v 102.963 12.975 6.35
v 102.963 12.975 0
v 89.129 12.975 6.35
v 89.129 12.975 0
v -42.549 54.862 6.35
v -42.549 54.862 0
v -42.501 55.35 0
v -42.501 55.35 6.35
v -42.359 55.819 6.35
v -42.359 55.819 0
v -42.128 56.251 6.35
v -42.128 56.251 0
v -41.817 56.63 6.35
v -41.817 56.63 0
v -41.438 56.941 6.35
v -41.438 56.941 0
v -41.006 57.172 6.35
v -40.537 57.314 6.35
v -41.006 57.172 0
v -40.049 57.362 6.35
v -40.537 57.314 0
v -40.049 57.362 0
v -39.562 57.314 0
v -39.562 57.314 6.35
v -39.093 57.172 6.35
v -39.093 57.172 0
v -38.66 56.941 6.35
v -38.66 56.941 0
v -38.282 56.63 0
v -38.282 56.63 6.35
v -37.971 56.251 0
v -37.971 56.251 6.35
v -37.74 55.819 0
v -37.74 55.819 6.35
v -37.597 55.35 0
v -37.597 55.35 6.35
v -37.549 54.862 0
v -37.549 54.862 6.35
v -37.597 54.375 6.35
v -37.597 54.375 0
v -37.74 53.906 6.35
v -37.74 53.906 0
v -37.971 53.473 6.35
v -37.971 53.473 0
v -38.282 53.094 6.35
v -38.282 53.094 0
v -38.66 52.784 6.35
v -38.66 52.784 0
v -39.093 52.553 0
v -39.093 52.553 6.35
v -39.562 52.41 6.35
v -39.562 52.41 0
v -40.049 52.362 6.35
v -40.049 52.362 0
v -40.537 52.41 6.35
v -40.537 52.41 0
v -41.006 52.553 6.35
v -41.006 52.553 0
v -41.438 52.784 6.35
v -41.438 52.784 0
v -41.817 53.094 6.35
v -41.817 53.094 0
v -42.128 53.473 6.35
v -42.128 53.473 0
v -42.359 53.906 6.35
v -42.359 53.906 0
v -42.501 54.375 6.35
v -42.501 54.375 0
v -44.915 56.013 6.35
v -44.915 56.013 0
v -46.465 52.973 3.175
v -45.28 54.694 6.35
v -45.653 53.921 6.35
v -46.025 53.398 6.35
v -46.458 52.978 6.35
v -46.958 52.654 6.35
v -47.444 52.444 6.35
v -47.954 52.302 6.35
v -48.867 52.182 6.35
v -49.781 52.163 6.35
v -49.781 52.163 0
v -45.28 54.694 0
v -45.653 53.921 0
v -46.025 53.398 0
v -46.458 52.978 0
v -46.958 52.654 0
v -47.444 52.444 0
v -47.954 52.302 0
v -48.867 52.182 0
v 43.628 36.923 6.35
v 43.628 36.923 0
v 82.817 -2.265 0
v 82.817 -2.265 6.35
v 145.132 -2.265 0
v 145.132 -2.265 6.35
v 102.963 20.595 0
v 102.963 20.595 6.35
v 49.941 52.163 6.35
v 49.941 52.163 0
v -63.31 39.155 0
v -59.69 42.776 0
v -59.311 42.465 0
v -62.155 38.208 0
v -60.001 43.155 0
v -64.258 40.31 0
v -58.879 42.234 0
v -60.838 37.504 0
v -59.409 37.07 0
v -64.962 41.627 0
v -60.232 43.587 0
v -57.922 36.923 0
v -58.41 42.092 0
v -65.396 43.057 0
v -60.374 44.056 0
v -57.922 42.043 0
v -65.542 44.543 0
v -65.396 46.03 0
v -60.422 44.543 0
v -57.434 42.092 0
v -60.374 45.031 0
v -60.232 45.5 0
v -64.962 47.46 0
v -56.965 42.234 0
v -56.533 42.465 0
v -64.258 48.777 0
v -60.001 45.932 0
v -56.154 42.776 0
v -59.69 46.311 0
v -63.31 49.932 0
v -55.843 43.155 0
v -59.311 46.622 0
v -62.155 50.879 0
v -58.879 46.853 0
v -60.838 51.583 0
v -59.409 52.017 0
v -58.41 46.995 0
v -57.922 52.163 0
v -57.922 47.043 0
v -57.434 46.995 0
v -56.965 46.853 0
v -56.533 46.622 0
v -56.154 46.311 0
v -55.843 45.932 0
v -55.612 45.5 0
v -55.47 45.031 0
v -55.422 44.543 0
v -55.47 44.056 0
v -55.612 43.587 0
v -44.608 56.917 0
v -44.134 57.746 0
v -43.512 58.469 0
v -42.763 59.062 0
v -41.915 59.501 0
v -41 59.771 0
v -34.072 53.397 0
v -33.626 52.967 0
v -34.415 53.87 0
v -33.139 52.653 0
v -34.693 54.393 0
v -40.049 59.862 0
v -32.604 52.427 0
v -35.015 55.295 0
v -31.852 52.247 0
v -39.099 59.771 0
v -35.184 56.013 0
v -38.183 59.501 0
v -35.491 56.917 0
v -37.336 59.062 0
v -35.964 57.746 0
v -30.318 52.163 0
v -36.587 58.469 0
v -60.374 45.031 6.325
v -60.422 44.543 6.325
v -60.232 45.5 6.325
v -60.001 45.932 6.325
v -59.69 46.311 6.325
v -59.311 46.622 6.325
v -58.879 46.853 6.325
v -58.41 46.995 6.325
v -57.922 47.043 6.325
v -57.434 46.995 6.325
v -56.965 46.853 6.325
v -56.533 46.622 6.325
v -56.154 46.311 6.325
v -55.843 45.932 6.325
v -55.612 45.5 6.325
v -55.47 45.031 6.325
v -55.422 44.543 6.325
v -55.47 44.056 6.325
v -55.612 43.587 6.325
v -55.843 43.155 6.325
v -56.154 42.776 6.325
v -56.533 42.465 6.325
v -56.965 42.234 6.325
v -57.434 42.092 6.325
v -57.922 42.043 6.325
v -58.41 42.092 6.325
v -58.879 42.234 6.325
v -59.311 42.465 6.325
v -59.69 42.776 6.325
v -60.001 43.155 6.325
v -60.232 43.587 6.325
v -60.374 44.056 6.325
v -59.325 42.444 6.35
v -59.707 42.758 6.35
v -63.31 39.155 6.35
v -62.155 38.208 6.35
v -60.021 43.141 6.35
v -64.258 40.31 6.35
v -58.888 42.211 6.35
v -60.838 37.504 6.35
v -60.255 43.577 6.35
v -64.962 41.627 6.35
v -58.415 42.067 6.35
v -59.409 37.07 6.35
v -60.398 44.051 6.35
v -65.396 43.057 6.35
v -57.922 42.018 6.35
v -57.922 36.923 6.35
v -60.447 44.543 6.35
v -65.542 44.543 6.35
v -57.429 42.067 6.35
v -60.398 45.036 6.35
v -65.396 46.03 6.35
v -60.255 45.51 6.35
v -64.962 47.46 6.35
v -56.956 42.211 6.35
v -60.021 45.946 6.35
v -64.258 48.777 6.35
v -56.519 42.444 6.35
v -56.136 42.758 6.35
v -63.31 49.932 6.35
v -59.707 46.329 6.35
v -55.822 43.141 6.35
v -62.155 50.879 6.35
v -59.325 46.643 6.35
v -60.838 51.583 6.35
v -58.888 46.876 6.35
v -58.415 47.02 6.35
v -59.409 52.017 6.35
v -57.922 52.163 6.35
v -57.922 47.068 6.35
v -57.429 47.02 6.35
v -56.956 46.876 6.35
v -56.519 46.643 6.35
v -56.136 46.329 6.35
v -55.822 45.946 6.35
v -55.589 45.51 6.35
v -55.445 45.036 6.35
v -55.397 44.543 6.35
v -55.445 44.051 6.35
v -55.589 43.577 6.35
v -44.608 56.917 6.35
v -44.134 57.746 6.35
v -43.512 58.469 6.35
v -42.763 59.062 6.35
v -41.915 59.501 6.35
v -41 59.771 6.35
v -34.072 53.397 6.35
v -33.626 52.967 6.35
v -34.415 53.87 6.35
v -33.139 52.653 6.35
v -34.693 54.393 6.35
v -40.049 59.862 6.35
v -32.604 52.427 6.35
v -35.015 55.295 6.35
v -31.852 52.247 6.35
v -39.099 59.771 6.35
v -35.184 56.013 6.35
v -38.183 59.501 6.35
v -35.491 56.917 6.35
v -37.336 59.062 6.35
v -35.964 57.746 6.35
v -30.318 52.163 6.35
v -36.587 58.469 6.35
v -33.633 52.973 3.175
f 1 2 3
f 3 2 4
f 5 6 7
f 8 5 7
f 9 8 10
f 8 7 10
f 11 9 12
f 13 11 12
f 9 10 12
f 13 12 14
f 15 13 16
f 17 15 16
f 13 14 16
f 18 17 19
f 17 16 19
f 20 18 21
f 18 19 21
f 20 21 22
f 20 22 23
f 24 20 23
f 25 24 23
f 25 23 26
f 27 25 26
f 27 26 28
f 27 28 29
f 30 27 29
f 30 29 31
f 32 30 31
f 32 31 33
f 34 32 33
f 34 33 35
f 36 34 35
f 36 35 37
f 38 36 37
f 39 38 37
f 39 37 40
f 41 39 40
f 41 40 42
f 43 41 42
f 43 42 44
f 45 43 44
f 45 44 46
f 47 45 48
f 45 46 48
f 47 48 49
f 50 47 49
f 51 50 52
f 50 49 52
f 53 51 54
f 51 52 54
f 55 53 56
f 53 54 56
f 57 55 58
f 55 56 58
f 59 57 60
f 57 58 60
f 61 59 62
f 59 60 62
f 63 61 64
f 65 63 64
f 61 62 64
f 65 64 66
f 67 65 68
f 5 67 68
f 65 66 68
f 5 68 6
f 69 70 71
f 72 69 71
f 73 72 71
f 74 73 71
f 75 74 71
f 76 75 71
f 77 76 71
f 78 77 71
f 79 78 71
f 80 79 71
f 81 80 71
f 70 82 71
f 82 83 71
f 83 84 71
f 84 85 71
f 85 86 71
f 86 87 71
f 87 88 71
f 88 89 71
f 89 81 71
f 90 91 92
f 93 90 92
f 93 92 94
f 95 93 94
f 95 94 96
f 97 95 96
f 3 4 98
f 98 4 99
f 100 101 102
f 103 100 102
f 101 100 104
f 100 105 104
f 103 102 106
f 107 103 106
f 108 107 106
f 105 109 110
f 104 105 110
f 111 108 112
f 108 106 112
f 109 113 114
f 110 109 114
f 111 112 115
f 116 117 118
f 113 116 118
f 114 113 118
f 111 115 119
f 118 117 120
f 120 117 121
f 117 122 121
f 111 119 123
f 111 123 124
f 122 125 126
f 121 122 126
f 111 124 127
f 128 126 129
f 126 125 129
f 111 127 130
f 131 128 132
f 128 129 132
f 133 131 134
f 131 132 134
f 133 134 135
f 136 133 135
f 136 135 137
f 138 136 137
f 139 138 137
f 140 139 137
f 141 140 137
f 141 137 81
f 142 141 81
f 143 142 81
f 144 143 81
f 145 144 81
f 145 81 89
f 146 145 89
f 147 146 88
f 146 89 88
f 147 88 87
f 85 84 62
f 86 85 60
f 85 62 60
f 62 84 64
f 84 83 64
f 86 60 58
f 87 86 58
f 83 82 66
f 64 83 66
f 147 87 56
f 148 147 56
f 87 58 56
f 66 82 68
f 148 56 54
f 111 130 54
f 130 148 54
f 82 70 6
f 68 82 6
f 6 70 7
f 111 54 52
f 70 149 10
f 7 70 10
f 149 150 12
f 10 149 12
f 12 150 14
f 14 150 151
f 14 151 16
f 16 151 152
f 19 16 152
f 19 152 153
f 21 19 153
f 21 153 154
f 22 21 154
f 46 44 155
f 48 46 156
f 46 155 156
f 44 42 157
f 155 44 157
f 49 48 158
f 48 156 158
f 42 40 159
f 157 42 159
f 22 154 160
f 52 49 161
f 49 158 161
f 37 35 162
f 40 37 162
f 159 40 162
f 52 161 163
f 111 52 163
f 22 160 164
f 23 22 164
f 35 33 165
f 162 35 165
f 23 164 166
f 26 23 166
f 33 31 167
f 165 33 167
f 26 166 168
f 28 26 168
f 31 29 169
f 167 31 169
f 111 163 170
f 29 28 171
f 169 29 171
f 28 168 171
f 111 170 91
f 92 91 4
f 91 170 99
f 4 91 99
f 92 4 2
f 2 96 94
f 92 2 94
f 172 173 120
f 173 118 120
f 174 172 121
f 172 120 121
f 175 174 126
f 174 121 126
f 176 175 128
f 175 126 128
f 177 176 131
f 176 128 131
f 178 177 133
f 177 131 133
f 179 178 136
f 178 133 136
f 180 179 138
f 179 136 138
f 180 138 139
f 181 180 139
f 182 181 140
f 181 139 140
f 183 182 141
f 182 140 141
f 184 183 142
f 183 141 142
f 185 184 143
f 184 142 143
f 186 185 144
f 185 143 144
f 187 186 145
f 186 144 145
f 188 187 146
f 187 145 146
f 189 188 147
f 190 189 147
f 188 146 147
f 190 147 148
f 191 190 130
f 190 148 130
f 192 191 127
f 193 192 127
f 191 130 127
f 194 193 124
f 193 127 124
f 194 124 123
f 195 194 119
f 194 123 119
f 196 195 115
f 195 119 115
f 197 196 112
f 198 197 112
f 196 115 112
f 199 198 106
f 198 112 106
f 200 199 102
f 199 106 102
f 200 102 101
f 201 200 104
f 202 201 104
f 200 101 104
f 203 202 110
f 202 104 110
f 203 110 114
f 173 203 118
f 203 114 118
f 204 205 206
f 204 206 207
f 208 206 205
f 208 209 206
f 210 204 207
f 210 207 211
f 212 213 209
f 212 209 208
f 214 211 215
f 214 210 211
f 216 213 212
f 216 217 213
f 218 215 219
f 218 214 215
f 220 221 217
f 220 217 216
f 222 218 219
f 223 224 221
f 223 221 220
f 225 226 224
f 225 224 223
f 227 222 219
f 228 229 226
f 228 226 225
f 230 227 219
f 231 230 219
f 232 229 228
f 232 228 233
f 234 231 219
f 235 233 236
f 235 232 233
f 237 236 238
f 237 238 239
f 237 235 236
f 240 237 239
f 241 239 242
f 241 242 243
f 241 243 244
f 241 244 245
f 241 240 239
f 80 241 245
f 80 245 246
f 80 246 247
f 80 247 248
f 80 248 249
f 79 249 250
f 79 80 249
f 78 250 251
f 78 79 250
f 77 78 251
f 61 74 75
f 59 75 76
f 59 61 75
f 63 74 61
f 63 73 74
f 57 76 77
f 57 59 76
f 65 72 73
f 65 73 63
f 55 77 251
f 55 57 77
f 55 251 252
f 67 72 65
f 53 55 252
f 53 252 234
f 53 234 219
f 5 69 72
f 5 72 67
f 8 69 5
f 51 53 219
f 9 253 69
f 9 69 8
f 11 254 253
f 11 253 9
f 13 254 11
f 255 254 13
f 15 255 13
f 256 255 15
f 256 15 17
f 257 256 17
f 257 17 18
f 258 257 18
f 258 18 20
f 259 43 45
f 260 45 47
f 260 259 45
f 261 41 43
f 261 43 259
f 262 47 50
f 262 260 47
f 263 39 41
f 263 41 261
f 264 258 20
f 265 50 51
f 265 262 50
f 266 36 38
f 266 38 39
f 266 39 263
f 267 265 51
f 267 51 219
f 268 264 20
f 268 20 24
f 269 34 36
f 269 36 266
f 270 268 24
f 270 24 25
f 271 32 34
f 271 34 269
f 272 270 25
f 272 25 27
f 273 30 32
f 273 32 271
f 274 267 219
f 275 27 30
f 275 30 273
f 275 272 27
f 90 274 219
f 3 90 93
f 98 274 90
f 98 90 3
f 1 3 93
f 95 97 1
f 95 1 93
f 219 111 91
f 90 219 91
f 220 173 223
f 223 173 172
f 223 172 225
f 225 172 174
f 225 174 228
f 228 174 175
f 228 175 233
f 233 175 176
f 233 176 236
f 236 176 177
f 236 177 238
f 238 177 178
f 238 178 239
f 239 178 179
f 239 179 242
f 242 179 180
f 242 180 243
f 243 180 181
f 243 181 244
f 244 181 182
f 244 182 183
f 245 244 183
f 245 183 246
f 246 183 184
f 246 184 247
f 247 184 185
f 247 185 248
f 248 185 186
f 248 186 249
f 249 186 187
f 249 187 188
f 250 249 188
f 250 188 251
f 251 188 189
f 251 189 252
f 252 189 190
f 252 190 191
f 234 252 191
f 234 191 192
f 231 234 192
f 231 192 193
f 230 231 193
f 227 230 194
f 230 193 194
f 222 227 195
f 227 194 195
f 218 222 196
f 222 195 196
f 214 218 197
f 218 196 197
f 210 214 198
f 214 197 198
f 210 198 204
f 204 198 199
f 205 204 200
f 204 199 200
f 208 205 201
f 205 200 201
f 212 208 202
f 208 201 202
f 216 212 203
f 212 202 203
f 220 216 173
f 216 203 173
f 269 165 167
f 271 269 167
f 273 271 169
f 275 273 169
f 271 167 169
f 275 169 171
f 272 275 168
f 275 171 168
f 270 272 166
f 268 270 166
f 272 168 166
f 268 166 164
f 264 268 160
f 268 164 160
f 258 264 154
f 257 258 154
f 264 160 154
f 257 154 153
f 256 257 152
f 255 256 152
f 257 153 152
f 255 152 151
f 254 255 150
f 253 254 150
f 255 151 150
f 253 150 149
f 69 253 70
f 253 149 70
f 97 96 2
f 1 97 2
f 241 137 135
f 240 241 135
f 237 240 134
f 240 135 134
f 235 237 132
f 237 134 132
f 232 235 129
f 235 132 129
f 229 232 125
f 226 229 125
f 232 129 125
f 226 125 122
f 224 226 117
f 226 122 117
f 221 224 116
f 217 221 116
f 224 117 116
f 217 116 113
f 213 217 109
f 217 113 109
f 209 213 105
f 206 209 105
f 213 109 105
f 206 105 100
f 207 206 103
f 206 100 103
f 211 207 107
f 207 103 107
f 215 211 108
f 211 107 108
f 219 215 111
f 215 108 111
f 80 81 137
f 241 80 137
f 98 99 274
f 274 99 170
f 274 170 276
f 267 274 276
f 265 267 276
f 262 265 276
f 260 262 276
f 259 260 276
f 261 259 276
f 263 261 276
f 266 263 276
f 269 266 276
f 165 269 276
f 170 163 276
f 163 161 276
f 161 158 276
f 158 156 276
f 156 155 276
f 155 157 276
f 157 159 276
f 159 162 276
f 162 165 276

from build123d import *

# Parameters (mm, degrees)
SKETCH1_R                       = 7.62
BOSS_EXTRUDE1_DEPTH             = 6.35
F_5_0MM_DOWEL_HOLE1_D           = 5
F_5_0MM_DOWEL_HOLE1_CSINK_D     = 5.05
F_5_0MM_DOWEL_HOLE1_CSINK_ANGLE = 90
BOSS_EXTRUDE3_DEPTH             = 6.35
FILLET2_DEPTH                   = 6.35
F_5_0MM_DOWEL_HOLE3_D           = 5


with BuildPart() as part:
    # Sketch1 → Boss-Extrude1 (new body)
    with BuildSketch(Plane.XY):
        with BuildLine():
            ThreePointArc((-50.301924176, 44.54348243), (-52.533770503, 39.155328757), (-57.921924176, 36.92348243))
            Line((-57.921924176, 36.92348243), (43.628363104, 36.92348243))
            Line((43.628363104, 36.92348243), (82.81675676, -2.264911225))
            Line((82.81675676, -2.264911225), (145.132424058, -2.264911225))
            Line((145.132424058, -2.264911225), (102.962916525, 20.595088775))
            Line((102.962916525, 20.595088775), (102.962916525, 12.975088775))
            Line((102.962916525, 12.975088775), (89.12937145, 12.975088775))
            Line((89.12937145, 12.975088775), (49.940977795, 52.16348243))
            Line((49.940977795, 52.16348243), (-57.921924176, 52.16348243))
            ThreePointArc((-57.921924176, 52.16348243), (-52.533770503, 49.931636103), (-50.301924176, 44.54348243))
        make_face()
        with Locations((-57.921924176, 44.54348243)):
            Circle(SKETCH1_R)
    extrude(amount=BOSS_EXTRUDE1_DEPTH)

    # Ø5.0mm Dowel Hole1 (through all)
    with Locations(Plane.XY.offset(6.35)):
        with Locations((-57.921924176, 44.54348243)):
            CounterSinkHole(F_5_0MM_DOWEL_HOLE1_D / 2, F_5_0MM_DOWEL_HOLE1_CSINK_D / 2, counter_sink_angle=F_5_0MM_DOWEL_HOLE1_CSINK_ANGLE)

    # Sketch4 → Boss-Extrude3 (add)
    with BuildSketch(Plane.XY):
        with BuildLine():
            Line((-45.049324905, 52.16348243), (-35.049324905, 52.16348243))
            Line((-35.049324905, 52.16348243), (-35.049324905, 54.86223243))
            ThreePointArc((-35.049324905, 54.86223243), (-40.049324905, 59.86223243), (-45.049324905, 54.86223243))
            Line((-45.049324905, 54.86223243), (-45.049324905, 52.16348243))
        make_face()
    extrude(amount=BOSS_EXTRUDE3_DEPTH)

    # Fillet2: read off the stored shape, not the designer's step
    # Fillet2 outline → Fillet2 (add)
    with BuildSketch(Plane.XY):
        with BuildLine():
            Line((-35.049324905, 52.16348243), (-30.317714122, 52.16348243))
            add(Edge.make_bspline(
                [(-30.317714122, 52.16348243), (-31.005571174, 52.16348243), (-31.693428226, 52.16348243), (-33.124030191, 52.387599223), (-34.337985858, 53.16866407), (-34.986310807, 54.947810993), (-35.077384253, 55.56402873), (-35.183519514, 56.01285743)],
                knots=[0, 0, 0, 0, 0, 0, 0.5, 0.5, 1, 1, 1, 1, 1, 1], degree=5))
            ThreePointArc((-35.183519514, 56.01285743), (-35.08298687, 55.441444413), (-35.049324905, 54.86223243))
            Line((-35.049324905, 54.86223243), (-35.049324905, 52.16348243))
        make_face()
        with BuildLine():
            ThreePointArc((-45.049324905, 54.86223243), (-45.01566294, 55.441444413), (-44.915130297, 56.01285743))
            add(Edge.make_bspline(
                [(-44.915130297, 56.01285743), (-45.021265558, 55.56402873), (-45.112339003, 54.947810993), (-45.760663953, 53.16866407), (-46.97461962, 52.387599223), (-48.405221585, 52.16348243), (-49.093078637, 52.16348243), (-49.780935689, 52.16348243)],
                knots=[0, 0, 0, 0, 0, 0, 0.5, 0.5, 1, 1, 1, 1, 1, 1], degree=5))
            Line((-49.780935689, 52.16348243), (-45.049324905, 52.16348243))
            Line((-45.049324905, 52.16348243), (-45.049324905, 54.86223243))
        make_face()
    extrude(amount=FILLET2_DEPTH)

    # Ø5.0mm Dowel Hole3 (through all)
    with Locations(Plane.XY.offset(6.35)):
        with Locations((-40.049324905, 54.86223243)):
            Hole(F_5_0MM_DOWEL_HOLE3_D / 2)


solid = part.part
